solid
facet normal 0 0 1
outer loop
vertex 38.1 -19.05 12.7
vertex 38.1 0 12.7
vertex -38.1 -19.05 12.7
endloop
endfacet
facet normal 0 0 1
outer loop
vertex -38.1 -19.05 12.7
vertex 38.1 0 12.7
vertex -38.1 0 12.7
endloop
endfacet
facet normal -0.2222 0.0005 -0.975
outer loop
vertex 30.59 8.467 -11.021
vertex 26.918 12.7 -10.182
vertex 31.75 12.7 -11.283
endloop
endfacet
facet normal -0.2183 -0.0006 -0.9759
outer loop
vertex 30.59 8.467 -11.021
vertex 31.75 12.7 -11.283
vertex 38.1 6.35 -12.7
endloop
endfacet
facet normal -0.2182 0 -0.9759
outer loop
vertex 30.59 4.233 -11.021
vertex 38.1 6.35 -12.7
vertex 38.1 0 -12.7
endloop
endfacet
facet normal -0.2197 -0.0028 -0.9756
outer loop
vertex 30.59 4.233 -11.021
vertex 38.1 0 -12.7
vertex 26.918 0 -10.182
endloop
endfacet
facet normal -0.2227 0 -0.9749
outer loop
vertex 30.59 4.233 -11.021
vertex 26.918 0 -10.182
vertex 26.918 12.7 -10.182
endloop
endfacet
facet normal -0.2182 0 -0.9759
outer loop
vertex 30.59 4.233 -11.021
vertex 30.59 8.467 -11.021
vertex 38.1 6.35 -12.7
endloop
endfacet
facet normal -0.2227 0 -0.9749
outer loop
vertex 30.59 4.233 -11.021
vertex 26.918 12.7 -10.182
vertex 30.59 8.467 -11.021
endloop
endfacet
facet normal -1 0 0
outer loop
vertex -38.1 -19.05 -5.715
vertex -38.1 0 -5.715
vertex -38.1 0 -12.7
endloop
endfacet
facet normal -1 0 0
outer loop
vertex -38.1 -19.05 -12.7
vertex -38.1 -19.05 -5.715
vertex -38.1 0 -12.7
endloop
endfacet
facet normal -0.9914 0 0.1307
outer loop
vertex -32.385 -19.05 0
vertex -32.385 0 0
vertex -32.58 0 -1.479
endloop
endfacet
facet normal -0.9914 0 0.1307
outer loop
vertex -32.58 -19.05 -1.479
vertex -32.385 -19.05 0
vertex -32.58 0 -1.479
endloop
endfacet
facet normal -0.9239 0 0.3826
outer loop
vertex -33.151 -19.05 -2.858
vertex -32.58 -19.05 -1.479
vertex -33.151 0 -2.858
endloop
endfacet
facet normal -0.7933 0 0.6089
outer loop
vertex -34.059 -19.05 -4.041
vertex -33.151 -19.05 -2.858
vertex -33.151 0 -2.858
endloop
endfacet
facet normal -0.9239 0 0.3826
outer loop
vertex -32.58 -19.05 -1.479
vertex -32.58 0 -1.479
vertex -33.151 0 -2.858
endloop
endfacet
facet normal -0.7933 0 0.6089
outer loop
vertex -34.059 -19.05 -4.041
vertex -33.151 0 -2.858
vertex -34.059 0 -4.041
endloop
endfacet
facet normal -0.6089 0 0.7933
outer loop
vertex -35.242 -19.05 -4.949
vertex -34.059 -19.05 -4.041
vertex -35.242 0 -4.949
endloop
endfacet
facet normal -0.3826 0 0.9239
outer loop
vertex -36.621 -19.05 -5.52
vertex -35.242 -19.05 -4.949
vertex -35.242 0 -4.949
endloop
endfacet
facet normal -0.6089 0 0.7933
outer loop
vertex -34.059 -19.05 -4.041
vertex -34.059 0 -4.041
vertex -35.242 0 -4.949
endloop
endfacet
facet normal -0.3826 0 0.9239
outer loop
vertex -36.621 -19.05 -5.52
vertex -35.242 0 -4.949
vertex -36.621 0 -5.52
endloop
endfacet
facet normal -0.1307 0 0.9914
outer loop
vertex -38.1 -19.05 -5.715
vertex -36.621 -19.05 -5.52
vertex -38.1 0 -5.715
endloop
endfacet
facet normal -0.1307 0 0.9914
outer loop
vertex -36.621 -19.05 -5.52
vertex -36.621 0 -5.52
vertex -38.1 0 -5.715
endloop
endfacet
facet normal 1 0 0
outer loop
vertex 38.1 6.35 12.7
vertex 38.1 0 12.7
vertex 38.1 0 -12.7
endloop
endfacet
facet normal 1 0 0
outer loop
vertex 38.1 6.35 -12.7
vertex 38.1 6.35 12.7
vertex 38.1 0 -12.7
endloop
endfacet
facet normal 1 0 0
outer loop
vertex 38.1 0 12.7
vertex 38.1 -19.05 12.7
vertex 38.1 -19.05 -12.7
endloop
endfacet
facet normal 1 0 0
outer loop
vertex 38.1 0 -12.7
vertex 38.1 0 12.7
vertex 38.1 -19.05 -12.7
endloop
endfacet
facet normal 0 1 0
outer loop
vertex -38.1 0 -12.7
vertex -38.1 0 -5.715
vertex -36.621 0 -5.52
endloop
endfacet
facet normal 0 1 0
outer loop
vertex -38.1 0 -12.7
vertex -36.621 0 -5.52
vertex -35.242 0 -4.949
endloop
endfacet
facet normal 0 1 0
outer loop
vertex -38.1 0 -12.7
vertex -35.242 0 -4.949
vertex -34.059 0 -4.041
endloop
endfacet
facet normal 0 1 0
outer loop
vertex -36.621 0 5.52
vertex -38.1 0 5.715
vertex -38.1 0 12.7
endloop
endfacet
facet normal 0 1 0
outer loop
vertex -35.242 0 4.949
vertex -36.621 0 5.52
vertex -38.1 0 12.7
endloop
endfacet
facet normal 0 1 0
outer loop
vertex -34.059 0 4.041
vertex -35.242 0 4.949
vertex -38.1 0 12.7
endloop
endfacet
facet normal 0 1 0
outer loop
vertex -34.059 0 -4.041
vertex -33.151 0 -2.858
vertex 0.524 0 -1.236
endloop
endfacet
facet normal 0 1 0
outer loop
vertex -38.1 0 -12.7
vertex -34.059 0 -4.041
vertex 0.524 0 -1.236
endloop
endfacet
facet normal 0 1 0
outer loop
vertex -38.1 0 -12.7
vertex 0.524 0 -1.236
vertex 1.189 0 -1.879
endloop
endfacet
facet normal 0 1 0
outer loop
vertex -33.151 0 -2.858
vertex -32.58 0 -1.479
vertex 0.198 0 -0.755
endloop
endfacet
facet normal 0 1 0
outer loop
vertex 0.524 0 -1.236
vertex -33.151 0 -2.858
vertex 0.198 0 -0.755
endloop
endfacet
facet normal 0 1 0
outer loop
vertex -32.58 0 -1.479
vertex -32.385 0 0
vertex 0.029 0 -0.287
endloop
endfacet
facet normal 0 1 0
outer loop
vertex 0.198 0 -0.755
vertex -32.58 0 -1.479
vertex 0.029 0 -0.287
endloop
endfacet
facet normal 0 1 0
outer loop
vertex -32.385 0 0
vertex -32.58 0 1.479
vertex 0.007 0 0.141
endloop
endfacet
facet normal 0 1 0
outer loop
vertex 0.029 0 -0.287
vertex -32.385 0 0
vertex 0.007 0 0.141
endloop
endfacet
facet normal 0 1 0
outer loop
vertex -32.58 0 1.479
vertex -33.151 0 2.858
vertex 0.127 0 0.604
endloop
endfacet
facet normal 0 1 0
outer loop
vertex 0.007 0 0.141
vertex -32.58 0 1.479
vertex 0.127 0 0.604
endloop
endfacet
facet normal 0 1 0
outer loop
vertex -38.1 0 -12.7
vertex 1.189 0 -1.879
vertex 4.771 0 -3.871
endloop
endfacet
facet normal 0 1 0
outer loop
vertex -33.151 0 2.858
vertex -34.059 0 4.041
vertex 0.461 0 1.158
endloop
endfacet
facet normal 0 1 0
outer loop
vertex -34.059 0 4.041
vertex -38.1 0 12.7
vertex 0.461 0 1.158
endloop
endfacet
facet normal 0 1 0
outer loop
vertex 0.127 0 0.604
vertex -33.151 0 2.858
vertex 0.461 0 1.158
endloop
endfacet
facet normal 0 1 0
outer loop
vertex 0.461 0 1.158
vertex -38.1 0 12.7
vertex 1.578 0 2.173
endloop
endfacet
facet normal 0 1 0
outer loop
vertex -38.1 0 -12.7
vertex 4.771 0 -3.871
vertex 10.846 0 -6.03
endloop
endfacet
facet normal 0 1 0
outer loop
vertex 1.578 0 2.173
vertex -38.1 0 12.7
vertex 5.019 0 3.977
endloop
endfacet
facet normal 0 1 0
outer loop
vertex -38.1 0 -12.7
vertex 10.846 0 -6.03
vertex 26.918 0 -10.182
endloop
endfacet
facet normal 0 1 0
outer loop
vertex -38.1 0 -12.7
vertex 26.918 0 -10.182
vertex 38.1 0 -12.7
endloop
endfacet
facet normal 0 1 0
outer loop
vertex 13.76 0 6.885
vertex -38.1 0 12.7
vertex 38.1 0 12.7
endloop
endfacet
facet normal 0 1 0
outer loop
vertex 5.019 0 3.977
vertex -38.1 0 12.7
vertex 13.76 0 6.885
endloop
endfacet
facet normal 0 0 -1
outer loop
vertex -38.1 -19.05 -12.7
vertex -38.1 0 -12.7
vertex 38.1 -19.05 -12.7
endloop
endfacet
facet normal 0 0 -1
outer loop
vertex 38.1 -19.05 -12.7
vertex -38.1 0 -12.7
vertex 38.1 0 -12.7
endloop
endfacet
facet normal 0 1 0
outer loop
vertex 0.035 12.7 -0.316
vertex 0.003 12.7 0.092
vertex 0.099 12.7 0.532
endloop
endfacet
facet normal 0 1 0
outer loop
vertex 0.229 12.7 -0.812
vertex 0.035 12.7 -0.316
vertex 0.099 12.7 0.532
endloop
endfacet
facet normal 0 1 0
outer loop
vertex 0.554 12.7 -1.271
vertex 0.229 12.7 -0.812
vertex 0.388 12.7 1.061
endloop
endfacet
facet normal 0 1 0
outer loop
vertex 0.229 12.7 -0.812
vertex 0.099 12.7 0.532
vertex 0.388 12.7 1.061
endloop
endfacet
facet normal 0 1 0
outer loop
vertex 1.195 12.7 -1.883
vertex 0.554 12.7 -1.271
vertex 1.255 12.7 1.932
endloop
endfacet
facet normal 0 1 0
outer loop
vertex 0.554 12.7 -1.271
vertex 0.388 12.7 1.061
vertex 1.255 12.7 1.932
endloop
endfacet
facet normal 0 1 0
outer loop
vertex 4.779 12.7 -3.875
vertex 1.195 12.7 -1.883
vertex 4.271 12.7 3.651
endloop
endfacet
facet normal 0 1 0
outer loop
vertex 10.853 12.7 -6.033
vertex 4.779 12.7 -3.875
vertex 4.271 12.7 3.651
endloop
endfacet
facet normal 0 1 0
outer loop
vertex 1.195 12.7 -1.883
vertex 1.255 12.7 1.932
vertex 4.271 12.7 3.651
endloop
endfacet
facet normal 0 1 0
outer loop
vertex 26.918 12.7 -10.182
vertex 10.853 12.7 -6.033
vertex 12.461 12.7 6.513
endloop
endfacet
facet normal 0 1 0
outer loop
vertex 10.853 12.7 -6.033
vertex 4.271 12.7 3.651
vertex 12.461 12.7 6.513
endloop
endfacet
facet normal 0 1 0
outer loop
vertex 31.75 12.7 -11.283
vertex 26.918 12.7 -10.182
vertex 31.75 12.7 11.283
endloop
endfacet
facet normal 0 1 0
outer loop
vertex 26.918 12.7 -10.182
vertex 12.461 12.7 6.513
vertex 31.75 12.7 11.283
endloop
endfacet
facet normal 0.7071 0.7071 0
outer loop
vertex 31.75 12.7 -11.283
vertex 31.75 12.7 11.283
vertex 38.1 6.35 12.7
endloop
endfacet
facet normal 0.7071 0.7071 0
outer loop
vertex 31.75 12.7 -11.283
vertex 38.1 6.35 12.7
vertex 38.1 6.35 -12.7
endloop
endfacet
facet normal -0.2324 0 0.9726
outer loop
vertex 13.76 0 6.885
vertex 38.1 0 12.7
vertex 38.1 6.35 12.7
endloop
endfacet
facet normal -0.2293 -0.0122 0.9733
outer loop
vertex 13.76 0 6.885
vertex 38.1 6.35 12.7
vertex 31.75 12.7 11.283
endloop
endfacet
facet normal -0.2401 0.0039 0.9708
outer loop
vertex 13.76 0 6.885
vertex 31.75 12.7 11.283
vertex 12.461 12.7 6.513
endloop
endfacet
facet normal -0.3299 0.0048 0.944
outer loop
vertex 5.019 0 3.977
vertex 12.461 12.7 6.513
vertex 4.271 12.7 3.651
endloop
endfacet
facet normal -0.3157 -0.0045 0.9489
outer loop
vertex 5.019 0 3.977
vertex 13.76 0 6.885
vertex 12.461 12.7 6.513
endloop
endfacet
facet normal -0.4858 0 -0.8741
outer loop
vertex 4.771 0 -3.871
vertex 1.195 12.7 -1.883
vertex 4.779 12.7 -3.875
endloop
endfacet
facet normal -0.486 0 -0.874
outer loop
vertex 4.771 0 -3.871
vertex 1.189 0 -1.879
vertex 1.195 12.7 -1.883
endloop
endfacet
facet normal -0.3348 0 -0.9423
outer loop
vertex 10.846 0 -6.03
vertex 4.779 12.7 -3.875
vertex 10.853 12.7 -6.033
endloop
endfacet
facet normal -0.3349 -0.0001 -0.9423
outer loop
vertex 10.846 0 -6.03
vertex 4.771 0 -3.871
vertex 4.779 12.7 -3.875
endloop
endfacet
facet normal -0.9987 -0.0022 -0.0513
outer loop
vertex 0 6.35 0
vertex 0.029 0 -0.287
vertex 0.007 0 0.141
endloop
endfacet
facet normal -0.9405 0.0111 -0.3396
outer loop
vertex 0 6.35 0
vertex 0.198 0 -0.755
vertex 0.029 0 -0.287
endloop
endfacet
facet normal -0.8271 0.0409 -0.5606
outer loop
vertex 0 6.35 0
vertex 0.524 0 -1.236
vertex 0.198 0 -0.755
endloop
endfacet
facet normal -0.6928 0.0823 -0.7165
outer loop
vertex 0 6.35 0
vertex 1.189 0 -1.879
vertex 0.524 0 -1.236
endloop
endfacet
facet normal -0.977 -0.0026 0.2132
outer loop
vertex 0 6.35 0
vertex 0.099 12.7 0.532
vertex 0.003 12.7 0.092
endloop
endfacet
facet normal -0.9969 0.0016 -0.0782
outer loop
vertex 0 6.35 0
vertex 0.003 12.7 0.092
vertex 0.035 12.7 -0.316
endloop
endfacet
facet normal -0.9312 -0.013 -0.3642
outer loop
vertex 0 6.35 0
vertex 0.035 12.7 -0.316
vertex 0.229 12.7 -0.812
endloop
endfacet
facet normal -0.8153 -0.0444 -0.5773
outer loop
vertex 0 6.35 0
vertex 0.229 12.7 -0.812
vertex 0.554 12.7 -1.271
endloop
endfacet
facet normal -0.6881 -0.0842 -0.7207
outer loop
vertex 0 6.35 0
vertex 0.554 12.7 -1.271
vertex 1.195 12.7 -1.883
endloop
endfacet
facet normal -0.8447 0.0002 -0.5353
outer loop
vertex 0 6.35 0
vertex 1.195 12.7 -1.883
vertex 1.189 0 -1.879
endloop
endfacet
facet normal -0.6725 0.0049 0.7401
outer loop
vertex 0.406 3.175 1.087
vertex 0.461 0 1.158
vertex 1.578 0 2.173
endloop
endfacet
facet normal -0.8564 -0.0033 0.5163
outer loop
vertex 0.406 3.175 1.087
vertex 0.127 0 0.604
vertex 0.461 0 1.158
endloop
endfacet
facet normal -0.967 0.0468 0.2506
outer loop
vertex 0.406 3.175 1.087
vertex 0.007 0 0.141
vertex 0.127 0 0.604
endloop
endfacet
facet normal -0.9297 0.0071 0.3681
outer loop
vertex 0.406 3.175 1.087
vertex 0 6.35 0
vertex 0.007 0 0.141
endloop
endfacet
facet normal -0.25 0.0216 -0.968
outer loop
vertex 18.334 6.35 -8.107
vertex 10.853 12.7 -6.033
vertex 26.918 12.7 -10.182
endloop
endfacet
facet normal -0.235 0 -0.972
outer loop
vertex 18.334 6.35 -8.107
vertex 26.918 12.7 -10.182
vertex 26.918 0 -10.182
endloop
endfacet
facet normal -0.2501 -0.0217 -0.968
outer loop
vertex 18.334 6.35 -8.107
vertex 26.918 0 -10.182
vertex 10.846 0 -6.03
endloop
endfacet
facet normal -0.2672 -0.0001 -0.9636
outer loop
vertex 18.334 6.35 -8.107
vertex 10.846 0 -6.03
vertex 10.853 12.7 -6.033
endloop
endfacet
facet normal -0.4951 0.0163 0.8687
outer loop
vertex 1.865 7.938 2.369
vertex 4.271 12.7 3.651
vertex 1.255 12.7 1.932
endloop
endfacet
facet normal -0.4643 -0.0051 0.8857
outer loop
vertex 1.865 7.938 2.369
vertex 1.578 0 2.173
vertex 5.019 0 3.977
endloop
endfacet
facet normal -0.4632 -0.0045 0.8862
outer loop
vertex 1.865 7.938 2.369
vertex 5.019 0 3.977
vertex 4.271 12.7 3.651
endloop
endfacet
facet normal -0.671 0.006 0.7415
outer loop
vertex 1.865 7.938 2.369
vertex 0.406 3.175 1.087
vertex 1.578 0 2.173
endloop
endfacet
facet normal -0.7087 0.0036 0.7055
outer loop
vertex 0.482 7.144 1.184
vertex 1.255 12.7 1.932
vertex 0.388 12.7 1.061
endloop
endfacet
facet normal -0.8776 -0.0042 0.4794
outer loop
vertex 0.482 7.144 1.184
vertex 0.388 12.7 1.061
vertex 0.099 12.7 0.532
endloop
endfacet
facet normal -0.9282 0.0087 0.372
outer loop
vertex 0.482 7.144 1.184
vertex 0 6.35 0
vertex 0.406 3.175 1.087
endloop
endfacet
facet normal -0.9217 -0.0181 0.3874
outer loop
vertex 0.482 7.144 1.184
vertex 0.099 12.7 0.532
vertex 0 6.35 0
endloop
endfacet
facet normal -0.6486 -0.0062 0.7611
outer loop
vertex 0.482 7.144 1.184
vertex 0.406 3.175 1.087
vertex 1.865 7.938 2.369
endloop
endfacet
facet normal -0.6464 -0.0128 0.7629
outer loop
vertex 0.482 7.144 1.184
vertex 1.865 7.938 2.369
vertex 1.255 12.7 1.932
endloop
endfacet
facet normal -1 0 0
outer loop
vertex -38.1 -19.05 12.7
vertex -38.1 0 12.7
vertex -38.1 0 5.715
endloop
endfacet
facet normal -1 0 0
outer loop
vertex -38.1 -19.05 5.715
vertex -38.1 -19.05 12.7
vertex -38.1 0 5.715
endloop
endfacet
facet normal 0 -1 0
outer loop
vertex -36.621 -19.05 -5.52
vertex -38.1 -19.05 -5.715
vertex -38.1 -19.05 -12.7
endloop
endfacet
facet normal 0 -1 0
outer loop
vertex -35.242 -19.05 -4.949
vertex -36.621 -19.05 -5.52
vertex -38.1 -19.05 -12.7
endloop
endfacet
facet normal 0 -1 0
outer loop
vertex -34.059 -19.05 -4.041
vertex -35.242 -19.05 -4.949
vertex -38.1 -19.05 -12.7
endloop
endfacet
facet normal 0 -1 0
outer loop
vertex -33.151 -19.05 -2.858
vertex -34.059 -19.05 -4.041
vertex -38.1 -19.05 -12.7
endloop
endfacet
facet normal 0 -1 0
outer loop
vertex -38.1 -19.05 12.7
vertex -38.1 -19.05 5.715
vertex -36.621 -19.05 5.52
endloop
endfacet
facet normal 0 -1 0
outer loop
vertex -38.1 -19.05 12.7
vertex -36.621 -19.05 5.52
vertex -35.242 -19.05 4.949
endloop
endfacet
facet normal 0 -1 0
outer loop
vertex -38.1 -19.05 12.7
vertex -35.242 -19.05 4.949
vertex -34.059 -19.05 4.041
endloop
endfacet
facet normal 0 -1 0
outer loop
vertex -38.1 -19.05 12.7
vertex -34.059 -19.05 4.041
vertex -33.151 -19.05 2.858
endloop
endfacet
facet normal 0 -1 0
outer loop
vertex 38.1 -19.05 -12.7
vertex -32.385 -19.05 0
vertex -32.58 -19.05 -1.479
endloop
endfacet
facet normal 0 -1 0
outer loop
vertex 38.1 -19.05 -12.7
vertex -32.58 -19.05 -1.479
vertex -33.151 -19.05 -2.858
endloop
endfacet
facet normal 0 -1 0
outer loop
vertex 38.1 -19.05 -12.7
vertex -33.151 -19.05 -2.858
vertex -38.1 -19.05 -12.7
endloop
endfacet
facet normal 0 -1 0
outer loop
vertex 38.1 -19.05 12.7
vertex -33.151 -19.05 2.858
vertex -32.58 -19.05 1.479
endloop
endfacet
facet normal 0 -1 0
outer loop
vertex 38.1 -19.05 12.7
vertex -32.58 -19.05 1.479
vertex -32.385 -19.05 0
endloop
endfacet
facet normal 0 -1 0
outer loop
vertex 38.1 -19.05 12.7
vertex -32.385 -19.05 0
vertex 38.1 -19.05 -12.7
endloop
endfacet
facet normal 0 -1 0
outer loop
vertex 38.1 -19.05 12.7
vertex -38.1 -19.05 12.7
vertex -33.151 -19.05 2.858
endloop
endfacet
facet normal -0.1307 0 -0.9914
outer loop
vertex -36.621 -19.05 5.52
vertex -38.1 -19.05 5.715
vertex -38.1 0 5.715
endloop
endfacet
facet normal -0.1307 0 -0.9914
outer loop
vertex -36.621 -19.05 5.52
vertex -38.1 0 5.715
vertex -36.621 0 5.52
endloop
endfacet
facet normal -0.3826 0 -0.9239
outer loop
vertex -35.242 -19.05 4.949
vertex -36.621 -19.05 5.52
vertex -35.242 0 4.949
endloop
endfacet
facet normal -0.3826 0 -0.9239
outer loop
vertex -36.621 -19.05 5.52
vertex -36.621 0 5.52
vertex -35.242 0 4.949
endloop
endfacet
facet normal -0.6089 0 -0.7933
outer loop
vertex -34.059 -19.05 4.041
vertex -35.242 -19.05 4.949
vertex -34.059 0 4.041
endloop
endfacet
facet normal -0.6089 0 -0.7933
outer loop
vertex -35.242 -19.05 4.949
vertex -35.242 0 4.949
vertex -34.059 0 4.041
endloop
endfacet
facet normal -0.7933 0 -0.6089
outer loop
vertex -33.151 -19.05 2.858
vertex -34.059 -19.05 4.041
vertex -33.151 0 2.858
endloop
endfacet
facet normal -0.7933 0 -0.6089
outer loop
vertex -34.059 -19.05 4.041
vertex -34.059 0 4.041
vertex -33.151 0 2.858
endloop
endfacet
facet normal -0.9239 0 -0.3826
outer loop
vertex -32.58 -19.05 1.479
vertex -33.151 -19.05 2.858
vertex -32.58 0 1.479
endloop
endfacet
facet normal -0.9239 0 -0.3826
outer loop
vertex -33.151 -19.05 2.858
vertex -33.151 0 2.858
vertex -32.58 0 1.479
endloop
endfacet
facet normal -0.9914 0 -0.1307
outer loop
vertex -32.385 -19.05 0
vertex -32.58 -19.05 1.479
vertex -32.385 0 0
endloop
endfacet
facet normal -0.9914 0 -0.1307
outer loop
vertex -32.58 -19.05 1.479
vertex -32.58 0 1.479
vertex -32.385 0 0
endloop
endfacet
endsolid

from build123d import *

# Parameters (mm, degrees)
F1_DEPTH = 19.05
F3_DEPTH = 12.7
F4_SIZE  = 6.35


with BuildPart() as f1:
    # F0 (on Front) → F1 (new body)
    with BuildSketch(Plane.XZ):
        with BuildLine():
            Line((38.1, -12.7), (38.1, 12.7))
            Line((38.1, 12.7), (-38.1, 12.7))
            Line((-38.1, 12.7), (-38.1, 5.715))
            ThreePointArc((-38.1, 5.715), (-34.0588847455, 4.0411152545), (-32.385, 0))
            ThreePointArc((-32.385, 0), (-34.0588847455, -4.0411152545), (-38.1, -5.715))
            Line((-38.1, -5.715), (-38.1, -12.7))
            Line((-38.1, -12.7), (38.1, -12.7))
        make_face()
    extrude(amount=F1_DEPTH)

    # F2 (on face) → F3 (join)
    with BuildSketch(Plane(origin=(0, 0, 0), x_dir=(-1, 0, 0), z_dir=(0, 1, 0))):
        with BuildLine():
            add(Edge.make_bspline(
                [(-38.1, 12.7), (-19.05, 8.4666666667), (15.2730799035, 0.839315577), (-12.2449852881, -6.7880355127), (-26.9177044879, -10.182053269)],
                knots=[0, 0, 0, 0, 0.5, 0.9008682389, 0.9008682389, 0.9008682389, 0.9008682389], degree=3))
            Line((-38.1, 12.7), (-38.1, -12.7))
            add(Edge.make_bspline(
                [(-26.9177044879, -10.182053269), (-30.546159807, -11.021368846), (-34.3230799035, -11.860684423), (-38.1, -12.7)],
                knots=[0.9008682389, 0.9008682389, 0.9008682389, 0.9008682389, 1, 1, 1, 1], degree=3))
        make_face()
    extrude(amount=F3_DEPTH)

    # F4
    f4_edges = [f1.edges().sort_by_distance(p)[0] for p in [
        (38.1, 12.7, 0),
    ]]
    chamfer(f4_edges, length=F4_SIZE)


solid = f1.part
